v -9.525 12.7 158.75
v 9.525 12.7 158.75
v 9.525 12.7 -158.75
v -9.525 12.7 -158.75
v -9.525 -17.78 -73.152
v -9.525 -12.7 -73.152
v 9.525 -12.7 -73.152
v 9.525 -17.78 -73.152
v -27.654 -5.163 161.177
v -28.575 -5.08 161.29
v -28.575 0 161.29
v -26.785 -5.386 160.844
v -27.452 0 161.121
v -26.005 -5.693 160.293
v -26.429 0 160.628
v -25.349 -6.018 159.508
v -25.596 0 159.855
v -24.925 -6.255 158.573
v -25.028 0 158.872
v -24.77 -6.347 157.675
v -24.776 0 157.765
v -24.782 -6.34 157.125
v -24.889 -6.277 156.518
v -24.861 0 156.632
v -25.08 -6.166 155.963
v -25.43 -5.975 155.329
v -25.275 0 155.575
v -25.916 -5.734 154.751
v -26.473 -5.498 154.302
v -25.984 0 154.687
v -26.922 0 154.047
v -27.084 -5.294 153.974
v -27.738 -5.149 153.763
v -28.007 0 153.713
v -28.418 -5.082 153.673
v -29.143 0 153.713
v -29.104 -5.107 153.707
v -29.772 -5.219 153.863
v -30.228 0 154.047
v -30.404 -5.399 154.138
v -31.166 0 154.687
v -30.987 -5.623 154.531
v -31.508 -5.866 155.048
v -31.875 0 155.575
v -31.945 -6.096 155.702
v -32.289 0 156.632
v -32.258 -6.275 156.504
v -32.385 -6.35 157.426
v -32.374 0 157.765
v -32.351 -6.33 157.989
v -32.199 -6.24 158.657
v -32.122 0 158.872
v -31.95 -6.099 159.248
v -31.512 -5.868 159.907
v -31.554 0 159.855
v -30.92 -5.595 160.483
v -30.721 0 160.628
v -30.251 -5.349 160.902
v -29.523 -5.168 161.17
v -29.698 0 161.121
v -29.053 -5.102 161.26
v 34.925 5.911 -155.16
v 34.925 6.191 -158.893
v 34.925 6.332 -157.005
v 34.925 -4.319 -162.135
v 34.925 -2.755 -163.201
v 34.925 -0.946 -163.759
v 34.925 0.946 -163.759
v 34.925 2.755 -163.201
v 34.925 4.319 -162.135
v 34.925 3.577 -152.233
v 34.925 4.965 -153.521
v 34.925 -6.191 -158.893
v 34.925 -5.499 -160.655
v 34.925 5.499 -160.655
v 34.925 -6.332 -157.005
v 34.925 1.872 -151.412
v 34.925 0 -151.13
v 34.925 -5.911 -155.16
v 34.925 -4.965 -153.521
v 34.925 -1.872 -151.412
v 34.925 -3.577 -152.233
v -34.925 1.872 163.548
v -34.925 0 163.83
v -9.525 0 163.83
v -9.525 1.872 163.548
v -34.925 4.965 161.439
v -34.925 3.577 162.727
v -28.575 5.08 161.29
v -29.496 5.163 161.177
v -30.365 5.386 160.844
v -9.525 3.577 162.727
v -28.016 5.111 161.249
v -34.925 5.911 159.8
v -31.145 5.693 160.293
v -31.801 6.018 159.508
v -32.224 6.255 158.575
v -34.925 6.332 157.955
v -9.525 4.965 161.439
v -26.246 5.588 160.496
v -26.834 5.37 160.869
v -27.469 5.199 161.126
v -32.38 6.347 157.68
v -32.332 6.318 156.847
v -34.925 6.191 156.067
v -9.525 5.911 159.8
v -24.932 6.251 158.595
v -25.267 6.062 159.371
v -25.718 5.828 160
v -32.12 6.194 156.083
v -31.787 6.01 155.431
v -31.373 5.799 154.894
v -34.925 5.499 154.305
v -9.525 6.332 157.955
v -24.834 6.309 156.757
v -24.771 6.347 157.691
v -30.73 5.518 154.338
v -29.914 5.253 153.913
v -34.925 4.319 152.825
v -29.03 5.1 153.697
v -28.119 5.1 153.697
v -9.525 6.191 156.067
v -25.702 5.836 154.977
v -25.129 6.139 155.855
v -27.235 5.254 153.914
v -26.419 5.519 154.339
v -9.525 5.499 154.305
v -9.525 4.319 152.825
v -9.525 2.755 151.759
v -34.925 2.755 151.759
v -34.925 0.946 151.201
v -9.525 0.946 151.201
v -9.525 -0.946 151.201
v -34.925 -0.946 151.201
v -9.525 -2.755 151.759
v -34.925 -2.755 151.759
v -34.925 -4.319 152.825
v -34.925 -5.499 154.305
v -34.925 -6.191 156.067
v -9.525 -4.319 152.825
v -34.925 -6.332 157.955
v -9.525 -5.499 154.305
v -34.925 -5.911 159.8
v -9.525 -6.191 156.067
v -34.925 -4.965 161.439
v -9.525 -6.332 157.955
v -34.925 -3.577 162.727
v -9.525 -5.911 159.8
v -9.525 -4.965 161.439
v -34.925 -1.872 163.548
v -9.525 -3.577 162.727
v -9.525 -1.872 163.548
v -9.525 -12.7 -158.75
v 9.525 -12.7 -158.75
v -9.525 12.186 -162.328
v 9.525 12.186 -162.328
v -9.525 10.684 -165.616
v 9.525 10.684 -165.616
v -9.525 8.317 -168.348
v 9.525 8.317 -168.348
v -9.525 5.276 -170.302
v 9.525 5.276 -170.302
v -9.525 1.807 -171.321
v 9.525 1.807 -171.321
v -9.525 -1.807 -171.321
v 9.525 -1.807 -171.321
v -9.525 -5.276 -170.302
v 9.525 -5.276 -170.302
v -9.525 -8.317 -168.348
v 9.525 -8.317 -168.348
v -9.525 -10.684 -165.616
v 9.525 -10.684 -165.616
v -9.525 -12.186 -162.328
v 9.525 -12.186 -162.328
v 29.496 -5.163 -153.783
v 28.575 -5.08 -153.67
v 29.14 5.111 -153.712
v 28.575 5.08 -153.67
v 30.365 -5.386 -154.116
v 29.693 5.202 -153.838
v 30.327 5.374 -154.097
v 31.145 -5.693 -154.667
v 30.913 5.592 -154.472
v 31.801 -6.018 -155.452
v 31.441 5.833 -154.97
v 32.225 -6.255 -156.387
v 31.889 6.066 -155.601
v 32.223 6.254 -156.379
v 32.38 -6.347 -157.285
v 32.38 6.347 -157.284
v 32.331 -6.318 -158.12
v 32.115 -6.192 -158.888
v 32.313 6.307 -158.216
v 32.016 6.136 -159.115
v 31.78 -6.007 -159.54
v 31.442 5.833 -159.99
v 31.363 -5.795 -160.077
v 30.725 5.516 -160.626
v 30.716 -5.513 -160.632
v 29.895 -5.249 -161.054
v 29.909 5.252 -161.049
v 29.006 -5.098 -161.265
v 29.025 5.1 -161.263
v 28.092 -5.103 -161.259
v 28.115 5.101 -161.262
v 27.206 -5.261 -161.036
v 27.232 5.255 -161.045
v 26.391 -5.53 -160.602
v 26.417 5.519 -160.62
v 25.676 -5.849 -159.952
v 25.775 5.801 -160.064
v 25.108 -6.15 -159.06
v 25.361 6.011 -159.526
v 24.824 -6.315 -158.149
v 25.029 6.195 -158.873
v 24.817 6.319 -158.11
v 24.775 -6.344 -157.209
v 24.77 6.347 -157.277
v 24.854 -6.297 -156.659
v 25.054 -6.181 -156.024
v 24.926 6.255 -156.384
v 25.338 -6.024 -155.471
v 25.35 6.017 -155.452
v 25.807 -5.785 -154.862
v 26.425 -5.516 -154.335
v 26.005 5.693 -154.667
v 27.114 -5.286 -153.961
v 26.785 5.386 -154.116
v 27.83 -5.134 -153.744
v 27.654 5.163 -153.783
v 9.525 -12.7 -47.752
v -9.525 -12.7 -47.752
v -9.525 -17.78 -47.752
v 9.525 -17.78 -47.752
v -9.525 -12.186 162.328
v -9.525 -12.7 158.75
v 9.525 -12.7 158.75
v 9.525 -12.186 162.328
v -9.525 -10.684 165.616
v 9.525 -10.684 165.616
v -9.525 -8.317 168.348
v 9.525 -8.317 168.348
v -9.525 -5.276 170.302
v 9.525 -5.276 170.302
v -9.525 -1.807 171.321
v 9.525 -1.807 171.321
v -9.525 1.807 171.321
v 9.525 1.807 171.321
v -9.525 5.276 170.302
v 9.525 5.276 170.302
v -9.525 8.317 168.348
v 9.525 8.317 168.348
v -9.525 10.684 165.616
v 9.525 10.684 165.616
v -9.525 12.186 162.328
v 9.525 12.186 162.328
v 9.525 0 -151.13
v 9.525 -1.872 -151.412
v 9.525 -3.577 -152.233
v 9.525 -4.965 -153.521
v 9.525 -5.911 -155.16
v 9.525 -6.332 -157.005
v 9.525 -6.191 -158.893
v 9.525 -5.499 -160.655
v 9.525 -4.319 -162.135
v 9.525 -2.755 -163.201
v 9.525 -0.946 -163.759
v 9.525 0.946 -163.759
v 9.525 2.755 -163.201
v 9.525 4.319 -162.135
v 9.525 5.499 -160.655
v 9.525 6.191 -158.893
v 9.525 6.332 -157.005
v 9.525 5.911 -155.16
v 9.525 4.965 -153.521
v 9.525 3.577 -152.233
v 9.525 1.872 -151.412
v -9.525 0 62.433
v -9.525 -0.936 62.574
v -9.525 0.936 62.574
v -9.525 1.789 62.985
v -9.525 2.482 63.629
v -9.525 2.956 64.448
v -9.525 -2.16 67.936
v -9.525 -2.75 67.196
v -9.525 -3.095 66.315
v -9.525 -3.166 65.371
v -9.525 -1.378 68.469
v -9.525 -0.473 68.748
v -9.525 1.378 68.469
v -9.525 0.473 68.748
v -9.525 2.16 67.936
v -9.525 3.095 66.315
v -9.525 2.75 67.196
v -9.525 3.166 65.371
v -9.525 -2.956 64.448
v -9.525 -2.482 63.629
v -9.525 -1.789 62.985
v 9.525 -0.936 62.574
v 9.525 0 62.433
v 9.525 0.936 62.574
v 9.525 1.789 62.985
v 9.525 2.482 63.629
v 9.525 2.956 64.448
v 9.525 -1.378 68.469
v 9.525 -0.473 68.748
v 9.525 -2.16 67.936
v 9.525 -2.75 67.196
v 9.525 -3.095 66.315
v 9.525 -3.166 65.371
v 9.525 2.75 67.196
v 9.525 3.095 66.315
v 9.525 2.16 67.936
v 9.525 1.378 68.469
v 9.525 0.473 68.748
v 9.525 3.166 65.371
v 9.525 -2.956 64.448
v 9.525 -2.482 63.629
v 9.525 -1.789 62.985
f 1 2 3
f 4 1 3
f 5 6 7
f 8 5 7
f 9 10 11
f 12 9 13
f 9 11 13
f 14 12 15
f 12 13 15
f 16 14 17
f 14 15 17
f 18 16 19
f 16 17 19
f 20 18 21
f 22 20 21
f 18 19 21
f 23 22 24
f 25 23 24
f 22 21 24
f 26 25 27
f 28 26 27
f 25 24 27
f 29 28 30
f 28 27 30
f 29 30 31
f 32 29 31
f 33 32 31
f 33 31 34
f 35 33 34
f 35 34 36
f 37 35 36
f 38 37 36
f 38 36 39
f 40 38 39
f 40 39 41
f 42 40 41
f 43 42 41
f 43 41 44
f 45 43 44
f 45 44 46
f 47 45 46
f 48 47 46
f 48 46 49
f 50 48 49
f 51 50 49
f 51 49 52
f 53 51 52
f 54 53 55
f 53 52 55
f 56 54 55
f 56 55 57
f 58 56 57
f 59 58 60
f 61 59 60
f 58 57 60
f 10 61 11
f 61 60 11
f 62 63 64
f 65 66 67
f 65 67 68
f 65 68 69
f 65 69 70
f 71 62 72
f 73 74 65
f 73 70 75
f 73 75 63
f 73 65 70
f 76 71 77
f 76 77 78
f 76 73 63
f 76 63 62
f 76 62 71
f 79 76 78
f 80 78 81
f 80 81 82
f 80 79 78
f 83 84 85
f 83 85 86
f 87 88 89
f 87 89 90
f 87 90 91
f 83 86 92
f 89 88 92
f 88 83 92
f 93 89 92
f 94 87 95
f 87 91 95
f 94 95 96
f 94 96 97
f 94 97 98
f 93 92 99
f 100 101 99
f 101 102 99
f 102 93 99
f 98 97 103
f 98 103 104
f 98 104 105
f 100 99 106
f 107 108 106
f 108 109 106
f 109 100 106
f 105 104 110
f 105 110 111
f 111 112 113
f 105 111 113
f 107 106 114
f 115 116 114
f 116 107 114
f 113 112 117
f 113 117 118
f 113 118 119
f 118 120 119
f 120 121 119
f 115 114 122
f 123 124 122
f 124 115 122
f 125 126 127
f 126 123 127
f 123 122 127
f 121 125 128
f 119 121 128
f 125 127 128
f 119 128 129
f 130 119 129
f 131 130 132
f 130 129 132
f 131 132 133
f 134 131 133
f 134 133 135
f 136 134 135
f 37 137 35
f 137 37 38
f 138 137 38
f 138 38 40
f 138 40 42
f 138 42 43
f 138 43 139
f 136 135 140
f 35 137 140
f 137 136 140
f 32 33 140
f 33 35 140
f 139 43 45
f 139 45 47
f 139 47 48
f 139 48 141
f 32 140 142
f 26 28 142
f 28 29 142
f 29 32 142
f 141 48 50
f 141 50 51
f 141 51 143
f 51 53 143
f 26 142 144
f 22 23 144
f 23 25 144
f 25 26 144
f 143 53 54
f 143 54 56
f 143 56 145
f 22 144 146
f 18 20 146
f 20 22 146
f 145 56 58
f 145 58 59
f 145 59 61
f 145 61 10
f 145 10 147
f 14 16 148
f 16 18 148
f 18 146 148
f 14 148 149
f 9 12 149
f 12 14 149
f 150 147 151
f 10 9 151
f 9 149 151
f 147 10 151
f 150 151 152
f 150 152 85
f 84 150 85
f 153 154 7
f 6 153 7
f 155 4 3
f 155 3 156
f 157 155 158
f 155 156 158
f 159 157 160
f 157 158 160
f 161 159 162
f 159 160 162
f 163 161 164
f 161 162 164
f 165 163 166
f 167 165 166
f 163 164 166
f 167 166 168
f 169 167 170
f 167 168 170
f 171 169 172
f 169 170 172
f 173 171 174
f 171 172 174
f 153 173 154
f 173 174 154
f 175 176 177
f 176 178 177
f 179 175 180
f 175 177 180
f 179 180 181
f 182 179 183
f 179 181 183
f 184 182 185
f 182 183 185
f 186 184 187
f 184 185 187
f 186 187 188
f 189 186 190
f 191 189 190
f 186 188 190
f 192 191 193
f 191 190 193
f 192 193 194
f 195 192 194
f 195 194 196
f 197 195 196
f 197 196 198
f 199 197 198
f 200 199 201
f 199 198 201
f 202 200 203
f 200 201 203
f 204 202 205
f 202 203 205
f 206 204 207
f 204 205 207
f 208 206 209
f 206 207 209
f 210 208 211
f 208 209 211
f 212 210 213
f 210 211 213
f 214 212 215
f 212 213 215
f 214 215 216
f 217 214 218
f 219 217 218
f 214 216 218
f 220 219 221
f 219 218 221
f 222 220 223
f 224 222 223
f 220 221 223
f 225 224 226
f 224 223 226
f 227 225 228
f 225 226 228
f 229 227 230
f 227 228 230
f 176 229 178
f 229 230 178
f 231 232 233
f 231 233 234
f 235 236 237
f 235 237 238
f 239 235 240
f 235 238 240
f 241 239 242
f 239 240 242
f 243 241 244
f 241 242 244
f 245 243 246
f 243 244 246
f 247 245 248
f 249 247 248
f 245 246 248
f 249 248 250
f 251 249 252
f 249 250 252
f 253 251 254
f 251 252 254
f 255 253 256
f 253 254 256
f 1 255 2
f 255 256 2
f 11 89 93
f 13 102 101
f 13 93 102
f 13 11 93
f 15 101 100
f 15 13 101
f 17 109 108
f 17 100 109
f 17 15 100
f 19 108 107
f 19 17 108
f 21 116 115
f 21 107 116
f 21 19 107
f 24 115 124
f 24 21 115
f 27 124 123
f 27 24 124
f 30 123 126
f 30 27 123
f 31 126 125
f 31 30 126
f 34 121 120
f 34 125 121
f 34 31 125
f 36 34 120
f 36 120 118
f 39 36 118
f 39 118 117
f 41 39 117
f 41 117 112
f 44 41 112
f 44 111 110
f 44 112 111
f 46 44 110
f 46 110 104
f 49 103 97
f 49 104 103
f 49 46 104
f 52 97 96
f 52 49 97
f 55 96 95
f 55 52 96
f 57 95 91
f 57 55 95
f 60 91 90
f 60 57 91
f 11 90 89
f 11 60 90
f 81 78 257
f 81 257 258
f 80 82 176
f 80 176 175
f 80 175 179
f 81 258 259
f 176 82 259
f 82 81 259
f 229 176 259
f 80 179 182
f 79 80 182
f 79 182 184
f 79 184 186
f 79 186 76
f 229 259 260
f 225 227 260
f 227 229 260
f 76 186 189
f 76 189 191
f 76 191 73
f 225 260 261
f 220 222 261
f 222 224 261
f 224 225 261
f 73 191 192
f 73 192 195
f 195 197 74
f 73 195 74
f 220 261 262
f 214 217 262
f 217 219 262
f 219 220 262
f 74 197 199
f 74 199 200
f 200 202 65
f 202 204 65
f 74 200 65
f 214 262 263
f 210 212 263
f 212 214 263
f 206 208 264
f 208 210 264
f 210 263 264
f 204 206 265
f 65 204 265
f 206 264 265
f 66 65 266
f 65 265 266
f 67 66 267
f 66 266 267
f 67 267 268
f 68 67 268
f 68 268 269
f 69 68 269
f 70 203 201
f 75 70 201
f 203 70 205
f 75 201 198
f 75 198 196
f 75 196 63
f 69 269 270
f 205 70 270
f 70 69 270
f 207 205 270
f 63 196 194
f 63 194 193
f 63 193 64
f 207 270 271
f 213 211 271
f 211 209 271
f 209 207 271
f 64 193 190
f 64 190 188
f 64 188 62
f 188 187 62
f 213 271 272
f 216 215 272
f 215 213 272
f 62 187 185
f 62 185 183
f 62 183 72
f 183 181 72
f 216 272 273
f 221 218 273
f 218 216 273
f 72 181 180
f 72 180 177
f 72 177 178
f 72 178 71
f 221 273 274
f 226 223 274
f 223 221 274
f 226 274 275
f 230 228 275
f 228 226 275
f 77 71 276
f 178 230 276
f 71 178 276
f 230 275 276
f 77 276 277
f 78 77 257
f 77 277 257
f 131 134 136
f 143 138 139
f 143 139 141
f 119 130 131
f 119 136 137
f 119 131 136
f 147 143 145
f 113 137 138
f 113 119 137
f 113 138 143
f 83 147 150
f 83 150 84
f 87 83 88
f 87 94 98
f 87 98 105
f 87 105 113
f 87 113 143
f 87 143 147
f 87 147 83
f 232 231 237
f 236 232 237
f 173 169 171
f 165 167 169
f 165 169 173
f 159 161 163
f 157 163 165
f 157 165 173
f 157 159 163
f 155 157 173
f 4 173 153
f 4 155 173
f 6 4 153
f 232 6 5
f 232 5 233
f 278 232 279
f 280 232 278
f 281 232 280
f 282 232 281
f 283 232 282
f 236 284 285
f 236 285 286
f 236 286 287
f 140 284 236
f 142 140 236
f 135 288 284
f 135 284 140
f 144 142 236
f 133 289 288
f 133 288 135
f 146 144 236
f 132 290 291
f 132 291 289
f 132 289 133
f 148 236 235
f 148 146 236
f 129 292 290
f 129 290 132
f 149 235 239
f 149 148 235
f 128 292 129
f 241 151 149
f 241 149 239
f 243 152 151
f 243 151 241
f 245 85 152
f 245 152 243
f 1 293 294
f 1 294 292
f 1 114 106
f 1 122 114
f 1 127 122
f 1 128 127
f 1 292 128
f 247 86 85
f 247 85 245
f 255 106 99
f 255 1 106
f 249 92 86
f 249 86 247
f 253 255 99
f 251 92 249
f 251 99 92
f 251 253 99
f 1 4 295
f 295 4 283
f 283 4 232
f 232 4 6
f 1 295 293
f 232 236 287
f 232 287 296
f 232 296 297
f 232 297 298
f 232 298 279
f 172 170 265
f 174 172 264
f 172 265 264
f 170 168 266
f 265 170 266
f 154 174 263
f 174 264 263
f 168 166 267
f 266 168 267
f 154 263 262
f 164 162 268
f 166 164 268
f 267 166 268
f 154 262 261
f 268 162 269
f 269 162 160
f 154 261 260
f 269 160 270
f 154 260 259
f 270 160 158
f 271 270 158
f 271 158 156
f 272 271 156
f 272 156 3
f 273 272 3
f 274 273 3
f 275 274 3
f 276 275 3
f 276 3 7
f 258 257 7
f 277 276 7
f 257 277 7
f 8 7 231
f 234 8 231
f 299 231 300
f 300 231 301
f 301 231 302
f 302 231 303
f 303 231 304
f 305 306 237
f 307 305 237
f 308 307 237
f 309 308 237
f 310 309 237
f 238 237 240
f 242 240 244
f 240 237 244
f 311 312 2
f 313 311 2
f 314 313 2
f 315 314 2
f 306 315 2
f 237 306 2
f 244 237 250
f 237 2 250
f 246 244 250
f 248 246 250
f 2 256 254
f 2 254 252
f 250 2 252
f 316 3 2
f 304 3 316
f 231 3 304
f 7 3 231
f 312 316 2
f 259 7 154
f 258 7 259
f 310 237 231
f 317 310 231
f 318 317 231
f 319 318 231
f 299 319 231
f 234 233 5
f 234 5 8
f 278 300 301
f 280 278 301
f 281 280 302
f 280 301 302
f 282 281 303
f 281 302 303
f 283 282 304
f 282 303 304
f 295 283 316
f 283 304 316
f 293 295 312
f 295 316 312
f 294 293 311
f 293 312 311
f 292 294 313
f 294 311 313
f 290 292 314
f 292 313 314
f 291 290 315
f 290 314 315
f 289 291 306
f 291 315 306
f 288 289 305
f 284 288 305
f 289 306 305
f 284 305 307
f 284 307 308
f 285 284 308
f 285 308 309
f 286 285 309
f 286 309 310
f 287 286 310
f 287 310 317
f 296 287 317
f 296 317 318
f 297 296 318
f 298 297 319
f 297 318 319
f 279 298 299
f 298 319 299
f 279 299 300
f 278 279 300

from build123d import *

# Parameters (mm, degrees)
BOSS_EXTRUDE1_DEPTH = 9.525
SKETCH4_R           = 6.35
BOSS_EXTRUDE2_DEPTH = 25.4
SKETCH5_R           = 6.35
BOSS_EXTRUDE3_DEPTH = 25.4
SKETCH6_R           = 3.175
CUT_EXTRUDE1_DEPTH  = 19.05
SKETCH7_W           = 19.05
SKETCH7_H           = 25.4
BOSS_EXTRUDE4_DEPTH = 5.08
SKETCH8_R           = 3.81
CUT_EXTRUDE2_DEPTH  = 6.35


with BuildPart() as part:
    # Sketch2 → Boss-Extrude1 (new, symmetric)
    with BuildSketch(Plane(origin=(0, 0, 0), x_dir=(0, 0, -1), z_dir=(1, 0, 0))):
        with BuildLine():
            Line((-158.75, 12.7), (158.75, 12.7))
            ThreePointArc((158.75, 12.7), (171.45, 0), (158.75, -12.7))
            Line((158.75, -12.7), (-158.75, -12.7))
            ThreePointArc((-158.75, -12.7), (-171.45, 0), (-158.75, 12.7))
        make_face()
    extrude(amount=BOSS_EXTRUDE1_DEPTH, both=True)

    # Sketch4 → Boss-Extrude2 (add)
    with BuildSketch(Plane.ZY.offset(9.525)):
        with Locations((157.48, 0)):
            Circle(SKETCH4_R)
    extrude(amount=BOSS_EXTRUDE2_DEPTH)

    # Sketch5 → Boss-Extrude3 (add)
    with BuildSketch(Plane(origin=(9.525, 0, 0), x_dir=(0, 0, -1), z_dir=(1, 0, 0))):
        with Locations(Location((157.48, 0, 0), (0, 0, 180))):
            Circle(SKETCH5_R)
    extrude(amount=BOSS_EXTRUDE3_DEPTH)

    # Sketch6 → Cut-Extrude1 (cut)
    with BuildSketch(Plane(origin=(9.525, 0, 0), x_dir=(0, 0, -1), z_dir=(1, 0, 0))):
        with Locations((-65.6082, 0)):
            Circle(SKETCH6_R)
    extrude(amount=-CUT_EXTRUDE1_DEPTH, mode=Mode.SUBTRACT)

    # Sketch7 → Boss-Extrude4 (add)
    with BuildSketch(Plane.XZ.offset(12.7)):
        with Locations((0, -60.452)):
            Rectangle(SKETCH7_W, SKETCH7_H)
    extrude(amount=BOSS_EXTRUDE4_DEPTH)

    # Sketch8 → Cut-Extrude2 (cut, symmetric)
    with BuildSketch(Plane(origin=(0, 0, 0), x_dir=(1, 0, 0), z_dir=(0, 1, 0))):
        with Locations(Location((-28.575, -157.48, 0), (0, 0, 270))):
            Circle(SKETCH8_R)
        with Locations(Location((28.575, 157.48, 0), (0, 0, 270))):
            Circle(SKETCH8_R)
    extrude(amount=CUT_EXTRUDE2_DEPTH, both=True, mode=Mode.SUBTRACT)


solid = part.part
